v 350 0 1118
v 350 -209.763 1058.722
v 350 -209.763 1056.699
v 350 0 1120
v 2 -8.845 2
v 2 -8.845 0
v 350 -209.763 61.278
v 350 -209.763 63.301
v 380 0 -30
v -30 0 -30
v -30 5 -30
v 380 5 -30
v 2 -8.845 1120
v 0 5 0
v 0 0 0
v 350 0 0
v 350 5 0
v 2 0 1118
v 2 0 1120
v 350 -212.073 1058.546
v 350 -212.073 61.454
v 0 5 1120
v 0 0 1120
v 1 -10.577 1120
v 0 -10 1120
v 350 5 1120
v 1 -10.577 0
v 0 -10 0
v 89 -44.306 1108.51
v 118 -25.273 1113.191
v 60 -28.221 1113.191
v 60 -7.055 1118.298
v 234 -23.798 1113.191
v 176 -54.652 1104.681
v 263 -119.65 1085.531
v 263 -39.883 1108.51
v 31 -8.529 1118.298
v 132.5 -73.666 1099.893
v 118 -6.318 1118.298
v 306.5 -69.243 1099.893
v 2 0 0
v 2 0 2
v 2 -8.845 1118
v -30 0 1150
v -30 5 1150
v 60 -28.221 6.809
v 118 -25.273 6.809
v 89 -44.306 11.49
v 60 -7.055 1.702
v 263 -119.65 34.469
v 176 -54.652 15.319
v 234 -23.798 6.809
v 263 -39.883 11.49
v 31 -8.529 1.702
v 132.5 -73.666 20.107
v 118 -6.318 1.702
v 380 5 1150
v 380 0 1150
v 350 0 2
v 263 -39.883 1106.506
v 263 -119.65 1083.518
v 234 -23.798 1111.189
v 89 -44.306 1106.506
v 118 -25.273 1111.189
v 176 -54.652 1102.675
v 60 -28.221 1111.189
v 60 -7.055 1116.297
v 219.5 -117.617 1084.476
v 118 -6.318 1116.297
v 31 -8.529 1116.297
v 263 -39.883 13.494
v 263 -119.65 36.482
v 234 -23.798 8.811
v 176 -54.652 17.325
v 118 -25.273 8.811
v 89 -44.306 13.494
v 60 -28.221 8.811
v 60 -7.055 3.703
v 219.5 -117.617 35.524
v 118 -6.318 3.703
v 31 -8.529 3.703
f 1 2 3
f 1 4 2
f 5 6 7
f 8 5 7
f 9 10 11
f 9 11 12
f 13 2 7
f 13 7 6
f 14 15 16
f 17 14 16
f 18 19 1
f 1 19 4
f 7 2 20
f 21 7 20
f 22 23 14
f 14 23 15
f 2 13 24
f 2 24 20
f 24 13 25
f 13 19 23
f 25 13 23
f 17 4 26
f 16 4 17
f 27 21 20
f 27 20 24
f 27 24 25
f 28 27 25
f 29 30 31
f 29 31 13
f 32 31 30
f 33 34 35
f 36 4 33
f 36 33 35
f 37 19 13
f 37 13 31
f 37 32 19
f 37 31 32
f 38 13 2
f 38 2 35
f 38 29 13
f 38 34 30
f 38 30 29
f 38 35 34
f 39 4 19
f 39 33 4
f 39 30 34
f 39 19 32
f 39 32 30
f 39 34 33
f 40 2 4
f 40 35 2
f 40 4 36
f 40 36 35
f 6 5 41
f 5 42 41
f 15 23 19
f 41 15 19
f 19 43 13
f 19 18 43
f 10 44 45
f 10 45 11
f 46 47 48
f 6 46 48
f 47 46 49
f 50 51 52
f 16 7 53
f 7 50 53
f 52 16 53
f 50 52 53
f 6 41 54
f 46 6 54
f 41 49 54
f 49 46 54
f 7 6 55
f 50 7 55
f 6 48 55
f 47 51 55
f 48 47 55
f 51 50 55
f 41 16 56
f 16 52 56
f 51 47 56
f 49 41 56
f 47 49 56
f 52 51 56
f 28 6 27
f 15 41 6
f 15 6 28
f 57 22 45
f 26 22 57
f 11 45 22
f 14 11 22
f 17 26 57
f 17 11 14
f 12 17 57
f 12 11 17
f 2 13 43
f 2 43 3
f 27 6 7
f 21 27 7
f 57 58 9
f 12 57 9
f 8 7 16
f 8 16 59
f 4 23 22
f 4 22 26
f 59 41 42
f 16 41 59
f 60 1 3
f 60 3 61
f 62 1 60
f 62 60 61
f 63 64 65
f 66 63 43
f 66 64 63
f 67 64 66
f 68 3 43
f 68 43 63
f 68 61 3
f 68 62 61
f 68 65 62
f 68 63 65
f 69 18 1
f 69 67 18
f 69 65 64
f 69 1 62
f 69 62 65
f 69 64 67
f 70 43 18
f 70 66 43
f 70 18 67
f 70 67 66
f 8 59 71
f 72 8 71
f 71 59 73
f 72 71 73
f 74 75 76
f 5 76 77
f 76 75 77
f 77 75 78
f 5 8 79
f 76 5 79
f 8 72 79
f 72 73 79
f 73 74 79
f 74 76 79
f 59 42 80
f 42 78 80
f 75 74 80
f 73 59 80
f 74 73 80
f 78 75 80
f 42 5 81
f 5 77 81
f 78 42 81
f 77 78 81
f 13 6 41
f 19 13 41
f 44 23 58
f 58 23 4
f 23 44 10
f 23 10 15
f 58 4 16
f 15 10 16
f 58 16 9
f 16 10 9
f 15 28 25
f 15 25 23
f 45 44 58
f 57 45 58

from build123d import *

# Parameters (mm, degrees)
DODANIE_WYCI_GNI_CIE1_DEPTH = 1120
SZKIC3_W                    = 410
SZKIC3_H                    = 1180
SZKIC3_W_2                  = 350
SZKIC3_H_2                  = 1120
DODANIE_WYCI_GNI_CIE2_DEPTH = 5
SKORUPA3_T                  = -2
WYTNIJ_WYCI_GNI_CIE1_DEPTH  = 90
SZKIC6_W                    = 348
SZKIC6_H                    = 2


with BuildPart() as part:
    # Szkic1 → Dodanie-wyciągnięcie1 (new body)
    with BuildSketch(Plane.XY):
        Polygon((0, 0), (350, 0), (350, -212.072594216), (0, -10), align=None)
    extrude(amount=DODANIE_WYCI_GNI_CIE1_DEPTH)

    # Skorupa3
    skorupa3_openings = [part.faces().sort_by_distance(p)[0] for p in [
        (228.07979599, -70.840965806, 1120),
        (228.07979599, -70.840965806, 0),
        (175, 0, 560),
        (350, -106.036297108, 560),
    ]]
    offset(amount=SKORUPA3_T, openings=skorupa3_openings, kind=Kind.INTERSECTION)

    # Szkic5 → Wytnij-wyciągnięcie1 (cut)
    with BuildSketch(Plane(origin=(-3.330127019, -5.767949192, 0), x_dir=(0.866025404, -0.5, 0), z_dir=(0.5, 0.866025404, 0))):
        Polygon((6.154700538, 0), (611.603832343, -92.327977863), (616.29746701, 26.332973574), (500.046687134, 176.768653302), align=None)
        Polygon((6.154700538, -1120), (574.381771599, -1033.348201059), (567.57139083, -1205.52313986), (177.827516191, -1478.396489856), align=None)
    extrude(amount=-WYTNIJ_WYCI_GNI_CIE1_DEPTH, mode=Mode.SUBTRACT)


with BuildPart() as body_2:
    # Szkic3 → Dodanie-wyciągnięcie2 (new body)
    with BuildSketch(Plane(origin=(0, 0, 0), x_dir=(1, 0, 0), z_dir=(0, 1, 0))):
        with Locations((175, -560)):
            Rectangle(SZKIC3_W, SZKIC3_H)
        with Locations((175, -560)):
            Rectangle(SZKIC3_W_2, SZKIC3_H_2, mode=Mode.SUBTRACT)
    extrude(amount=DODANIE_WYCI_GNI_CIE2_DEPTH)


with BuildPart() as body_3:
    # Szkic7 → Wyciągnięcie po profilach2 section 0
    with BuildSketch(Plane(origin=(-3.330127019, -5.767949192, 0), x_dir=(0.866025404, -0.5, 0), z_dir=(0.5, 0.866025404, 0))):
        Polygon((6.154700538, -1120), (407.990487894, -1058.722043305), (407.990487894, -1056.698904856), (6.154700538, -1118), align=None)
    # Szkic6 → Wyciągnięcie po profilach2 section 1
    with BuildSketch(Plane.XZ):
        with Locations((176, 1119)):
            Rectangle(SZKIC6_W, SZKIC6_H)
    loft()


with BuildPart() as body_4:
    # Lustro1: mirrored copy
    add(body_3.part.mirror(Plane(origin=(0, 0, 560), x_dir=(1, 0, 0), z_dir=(0, 0, -1))))


solid = Compound([part.part, body_2.part, body_3.part, body_4.part])
